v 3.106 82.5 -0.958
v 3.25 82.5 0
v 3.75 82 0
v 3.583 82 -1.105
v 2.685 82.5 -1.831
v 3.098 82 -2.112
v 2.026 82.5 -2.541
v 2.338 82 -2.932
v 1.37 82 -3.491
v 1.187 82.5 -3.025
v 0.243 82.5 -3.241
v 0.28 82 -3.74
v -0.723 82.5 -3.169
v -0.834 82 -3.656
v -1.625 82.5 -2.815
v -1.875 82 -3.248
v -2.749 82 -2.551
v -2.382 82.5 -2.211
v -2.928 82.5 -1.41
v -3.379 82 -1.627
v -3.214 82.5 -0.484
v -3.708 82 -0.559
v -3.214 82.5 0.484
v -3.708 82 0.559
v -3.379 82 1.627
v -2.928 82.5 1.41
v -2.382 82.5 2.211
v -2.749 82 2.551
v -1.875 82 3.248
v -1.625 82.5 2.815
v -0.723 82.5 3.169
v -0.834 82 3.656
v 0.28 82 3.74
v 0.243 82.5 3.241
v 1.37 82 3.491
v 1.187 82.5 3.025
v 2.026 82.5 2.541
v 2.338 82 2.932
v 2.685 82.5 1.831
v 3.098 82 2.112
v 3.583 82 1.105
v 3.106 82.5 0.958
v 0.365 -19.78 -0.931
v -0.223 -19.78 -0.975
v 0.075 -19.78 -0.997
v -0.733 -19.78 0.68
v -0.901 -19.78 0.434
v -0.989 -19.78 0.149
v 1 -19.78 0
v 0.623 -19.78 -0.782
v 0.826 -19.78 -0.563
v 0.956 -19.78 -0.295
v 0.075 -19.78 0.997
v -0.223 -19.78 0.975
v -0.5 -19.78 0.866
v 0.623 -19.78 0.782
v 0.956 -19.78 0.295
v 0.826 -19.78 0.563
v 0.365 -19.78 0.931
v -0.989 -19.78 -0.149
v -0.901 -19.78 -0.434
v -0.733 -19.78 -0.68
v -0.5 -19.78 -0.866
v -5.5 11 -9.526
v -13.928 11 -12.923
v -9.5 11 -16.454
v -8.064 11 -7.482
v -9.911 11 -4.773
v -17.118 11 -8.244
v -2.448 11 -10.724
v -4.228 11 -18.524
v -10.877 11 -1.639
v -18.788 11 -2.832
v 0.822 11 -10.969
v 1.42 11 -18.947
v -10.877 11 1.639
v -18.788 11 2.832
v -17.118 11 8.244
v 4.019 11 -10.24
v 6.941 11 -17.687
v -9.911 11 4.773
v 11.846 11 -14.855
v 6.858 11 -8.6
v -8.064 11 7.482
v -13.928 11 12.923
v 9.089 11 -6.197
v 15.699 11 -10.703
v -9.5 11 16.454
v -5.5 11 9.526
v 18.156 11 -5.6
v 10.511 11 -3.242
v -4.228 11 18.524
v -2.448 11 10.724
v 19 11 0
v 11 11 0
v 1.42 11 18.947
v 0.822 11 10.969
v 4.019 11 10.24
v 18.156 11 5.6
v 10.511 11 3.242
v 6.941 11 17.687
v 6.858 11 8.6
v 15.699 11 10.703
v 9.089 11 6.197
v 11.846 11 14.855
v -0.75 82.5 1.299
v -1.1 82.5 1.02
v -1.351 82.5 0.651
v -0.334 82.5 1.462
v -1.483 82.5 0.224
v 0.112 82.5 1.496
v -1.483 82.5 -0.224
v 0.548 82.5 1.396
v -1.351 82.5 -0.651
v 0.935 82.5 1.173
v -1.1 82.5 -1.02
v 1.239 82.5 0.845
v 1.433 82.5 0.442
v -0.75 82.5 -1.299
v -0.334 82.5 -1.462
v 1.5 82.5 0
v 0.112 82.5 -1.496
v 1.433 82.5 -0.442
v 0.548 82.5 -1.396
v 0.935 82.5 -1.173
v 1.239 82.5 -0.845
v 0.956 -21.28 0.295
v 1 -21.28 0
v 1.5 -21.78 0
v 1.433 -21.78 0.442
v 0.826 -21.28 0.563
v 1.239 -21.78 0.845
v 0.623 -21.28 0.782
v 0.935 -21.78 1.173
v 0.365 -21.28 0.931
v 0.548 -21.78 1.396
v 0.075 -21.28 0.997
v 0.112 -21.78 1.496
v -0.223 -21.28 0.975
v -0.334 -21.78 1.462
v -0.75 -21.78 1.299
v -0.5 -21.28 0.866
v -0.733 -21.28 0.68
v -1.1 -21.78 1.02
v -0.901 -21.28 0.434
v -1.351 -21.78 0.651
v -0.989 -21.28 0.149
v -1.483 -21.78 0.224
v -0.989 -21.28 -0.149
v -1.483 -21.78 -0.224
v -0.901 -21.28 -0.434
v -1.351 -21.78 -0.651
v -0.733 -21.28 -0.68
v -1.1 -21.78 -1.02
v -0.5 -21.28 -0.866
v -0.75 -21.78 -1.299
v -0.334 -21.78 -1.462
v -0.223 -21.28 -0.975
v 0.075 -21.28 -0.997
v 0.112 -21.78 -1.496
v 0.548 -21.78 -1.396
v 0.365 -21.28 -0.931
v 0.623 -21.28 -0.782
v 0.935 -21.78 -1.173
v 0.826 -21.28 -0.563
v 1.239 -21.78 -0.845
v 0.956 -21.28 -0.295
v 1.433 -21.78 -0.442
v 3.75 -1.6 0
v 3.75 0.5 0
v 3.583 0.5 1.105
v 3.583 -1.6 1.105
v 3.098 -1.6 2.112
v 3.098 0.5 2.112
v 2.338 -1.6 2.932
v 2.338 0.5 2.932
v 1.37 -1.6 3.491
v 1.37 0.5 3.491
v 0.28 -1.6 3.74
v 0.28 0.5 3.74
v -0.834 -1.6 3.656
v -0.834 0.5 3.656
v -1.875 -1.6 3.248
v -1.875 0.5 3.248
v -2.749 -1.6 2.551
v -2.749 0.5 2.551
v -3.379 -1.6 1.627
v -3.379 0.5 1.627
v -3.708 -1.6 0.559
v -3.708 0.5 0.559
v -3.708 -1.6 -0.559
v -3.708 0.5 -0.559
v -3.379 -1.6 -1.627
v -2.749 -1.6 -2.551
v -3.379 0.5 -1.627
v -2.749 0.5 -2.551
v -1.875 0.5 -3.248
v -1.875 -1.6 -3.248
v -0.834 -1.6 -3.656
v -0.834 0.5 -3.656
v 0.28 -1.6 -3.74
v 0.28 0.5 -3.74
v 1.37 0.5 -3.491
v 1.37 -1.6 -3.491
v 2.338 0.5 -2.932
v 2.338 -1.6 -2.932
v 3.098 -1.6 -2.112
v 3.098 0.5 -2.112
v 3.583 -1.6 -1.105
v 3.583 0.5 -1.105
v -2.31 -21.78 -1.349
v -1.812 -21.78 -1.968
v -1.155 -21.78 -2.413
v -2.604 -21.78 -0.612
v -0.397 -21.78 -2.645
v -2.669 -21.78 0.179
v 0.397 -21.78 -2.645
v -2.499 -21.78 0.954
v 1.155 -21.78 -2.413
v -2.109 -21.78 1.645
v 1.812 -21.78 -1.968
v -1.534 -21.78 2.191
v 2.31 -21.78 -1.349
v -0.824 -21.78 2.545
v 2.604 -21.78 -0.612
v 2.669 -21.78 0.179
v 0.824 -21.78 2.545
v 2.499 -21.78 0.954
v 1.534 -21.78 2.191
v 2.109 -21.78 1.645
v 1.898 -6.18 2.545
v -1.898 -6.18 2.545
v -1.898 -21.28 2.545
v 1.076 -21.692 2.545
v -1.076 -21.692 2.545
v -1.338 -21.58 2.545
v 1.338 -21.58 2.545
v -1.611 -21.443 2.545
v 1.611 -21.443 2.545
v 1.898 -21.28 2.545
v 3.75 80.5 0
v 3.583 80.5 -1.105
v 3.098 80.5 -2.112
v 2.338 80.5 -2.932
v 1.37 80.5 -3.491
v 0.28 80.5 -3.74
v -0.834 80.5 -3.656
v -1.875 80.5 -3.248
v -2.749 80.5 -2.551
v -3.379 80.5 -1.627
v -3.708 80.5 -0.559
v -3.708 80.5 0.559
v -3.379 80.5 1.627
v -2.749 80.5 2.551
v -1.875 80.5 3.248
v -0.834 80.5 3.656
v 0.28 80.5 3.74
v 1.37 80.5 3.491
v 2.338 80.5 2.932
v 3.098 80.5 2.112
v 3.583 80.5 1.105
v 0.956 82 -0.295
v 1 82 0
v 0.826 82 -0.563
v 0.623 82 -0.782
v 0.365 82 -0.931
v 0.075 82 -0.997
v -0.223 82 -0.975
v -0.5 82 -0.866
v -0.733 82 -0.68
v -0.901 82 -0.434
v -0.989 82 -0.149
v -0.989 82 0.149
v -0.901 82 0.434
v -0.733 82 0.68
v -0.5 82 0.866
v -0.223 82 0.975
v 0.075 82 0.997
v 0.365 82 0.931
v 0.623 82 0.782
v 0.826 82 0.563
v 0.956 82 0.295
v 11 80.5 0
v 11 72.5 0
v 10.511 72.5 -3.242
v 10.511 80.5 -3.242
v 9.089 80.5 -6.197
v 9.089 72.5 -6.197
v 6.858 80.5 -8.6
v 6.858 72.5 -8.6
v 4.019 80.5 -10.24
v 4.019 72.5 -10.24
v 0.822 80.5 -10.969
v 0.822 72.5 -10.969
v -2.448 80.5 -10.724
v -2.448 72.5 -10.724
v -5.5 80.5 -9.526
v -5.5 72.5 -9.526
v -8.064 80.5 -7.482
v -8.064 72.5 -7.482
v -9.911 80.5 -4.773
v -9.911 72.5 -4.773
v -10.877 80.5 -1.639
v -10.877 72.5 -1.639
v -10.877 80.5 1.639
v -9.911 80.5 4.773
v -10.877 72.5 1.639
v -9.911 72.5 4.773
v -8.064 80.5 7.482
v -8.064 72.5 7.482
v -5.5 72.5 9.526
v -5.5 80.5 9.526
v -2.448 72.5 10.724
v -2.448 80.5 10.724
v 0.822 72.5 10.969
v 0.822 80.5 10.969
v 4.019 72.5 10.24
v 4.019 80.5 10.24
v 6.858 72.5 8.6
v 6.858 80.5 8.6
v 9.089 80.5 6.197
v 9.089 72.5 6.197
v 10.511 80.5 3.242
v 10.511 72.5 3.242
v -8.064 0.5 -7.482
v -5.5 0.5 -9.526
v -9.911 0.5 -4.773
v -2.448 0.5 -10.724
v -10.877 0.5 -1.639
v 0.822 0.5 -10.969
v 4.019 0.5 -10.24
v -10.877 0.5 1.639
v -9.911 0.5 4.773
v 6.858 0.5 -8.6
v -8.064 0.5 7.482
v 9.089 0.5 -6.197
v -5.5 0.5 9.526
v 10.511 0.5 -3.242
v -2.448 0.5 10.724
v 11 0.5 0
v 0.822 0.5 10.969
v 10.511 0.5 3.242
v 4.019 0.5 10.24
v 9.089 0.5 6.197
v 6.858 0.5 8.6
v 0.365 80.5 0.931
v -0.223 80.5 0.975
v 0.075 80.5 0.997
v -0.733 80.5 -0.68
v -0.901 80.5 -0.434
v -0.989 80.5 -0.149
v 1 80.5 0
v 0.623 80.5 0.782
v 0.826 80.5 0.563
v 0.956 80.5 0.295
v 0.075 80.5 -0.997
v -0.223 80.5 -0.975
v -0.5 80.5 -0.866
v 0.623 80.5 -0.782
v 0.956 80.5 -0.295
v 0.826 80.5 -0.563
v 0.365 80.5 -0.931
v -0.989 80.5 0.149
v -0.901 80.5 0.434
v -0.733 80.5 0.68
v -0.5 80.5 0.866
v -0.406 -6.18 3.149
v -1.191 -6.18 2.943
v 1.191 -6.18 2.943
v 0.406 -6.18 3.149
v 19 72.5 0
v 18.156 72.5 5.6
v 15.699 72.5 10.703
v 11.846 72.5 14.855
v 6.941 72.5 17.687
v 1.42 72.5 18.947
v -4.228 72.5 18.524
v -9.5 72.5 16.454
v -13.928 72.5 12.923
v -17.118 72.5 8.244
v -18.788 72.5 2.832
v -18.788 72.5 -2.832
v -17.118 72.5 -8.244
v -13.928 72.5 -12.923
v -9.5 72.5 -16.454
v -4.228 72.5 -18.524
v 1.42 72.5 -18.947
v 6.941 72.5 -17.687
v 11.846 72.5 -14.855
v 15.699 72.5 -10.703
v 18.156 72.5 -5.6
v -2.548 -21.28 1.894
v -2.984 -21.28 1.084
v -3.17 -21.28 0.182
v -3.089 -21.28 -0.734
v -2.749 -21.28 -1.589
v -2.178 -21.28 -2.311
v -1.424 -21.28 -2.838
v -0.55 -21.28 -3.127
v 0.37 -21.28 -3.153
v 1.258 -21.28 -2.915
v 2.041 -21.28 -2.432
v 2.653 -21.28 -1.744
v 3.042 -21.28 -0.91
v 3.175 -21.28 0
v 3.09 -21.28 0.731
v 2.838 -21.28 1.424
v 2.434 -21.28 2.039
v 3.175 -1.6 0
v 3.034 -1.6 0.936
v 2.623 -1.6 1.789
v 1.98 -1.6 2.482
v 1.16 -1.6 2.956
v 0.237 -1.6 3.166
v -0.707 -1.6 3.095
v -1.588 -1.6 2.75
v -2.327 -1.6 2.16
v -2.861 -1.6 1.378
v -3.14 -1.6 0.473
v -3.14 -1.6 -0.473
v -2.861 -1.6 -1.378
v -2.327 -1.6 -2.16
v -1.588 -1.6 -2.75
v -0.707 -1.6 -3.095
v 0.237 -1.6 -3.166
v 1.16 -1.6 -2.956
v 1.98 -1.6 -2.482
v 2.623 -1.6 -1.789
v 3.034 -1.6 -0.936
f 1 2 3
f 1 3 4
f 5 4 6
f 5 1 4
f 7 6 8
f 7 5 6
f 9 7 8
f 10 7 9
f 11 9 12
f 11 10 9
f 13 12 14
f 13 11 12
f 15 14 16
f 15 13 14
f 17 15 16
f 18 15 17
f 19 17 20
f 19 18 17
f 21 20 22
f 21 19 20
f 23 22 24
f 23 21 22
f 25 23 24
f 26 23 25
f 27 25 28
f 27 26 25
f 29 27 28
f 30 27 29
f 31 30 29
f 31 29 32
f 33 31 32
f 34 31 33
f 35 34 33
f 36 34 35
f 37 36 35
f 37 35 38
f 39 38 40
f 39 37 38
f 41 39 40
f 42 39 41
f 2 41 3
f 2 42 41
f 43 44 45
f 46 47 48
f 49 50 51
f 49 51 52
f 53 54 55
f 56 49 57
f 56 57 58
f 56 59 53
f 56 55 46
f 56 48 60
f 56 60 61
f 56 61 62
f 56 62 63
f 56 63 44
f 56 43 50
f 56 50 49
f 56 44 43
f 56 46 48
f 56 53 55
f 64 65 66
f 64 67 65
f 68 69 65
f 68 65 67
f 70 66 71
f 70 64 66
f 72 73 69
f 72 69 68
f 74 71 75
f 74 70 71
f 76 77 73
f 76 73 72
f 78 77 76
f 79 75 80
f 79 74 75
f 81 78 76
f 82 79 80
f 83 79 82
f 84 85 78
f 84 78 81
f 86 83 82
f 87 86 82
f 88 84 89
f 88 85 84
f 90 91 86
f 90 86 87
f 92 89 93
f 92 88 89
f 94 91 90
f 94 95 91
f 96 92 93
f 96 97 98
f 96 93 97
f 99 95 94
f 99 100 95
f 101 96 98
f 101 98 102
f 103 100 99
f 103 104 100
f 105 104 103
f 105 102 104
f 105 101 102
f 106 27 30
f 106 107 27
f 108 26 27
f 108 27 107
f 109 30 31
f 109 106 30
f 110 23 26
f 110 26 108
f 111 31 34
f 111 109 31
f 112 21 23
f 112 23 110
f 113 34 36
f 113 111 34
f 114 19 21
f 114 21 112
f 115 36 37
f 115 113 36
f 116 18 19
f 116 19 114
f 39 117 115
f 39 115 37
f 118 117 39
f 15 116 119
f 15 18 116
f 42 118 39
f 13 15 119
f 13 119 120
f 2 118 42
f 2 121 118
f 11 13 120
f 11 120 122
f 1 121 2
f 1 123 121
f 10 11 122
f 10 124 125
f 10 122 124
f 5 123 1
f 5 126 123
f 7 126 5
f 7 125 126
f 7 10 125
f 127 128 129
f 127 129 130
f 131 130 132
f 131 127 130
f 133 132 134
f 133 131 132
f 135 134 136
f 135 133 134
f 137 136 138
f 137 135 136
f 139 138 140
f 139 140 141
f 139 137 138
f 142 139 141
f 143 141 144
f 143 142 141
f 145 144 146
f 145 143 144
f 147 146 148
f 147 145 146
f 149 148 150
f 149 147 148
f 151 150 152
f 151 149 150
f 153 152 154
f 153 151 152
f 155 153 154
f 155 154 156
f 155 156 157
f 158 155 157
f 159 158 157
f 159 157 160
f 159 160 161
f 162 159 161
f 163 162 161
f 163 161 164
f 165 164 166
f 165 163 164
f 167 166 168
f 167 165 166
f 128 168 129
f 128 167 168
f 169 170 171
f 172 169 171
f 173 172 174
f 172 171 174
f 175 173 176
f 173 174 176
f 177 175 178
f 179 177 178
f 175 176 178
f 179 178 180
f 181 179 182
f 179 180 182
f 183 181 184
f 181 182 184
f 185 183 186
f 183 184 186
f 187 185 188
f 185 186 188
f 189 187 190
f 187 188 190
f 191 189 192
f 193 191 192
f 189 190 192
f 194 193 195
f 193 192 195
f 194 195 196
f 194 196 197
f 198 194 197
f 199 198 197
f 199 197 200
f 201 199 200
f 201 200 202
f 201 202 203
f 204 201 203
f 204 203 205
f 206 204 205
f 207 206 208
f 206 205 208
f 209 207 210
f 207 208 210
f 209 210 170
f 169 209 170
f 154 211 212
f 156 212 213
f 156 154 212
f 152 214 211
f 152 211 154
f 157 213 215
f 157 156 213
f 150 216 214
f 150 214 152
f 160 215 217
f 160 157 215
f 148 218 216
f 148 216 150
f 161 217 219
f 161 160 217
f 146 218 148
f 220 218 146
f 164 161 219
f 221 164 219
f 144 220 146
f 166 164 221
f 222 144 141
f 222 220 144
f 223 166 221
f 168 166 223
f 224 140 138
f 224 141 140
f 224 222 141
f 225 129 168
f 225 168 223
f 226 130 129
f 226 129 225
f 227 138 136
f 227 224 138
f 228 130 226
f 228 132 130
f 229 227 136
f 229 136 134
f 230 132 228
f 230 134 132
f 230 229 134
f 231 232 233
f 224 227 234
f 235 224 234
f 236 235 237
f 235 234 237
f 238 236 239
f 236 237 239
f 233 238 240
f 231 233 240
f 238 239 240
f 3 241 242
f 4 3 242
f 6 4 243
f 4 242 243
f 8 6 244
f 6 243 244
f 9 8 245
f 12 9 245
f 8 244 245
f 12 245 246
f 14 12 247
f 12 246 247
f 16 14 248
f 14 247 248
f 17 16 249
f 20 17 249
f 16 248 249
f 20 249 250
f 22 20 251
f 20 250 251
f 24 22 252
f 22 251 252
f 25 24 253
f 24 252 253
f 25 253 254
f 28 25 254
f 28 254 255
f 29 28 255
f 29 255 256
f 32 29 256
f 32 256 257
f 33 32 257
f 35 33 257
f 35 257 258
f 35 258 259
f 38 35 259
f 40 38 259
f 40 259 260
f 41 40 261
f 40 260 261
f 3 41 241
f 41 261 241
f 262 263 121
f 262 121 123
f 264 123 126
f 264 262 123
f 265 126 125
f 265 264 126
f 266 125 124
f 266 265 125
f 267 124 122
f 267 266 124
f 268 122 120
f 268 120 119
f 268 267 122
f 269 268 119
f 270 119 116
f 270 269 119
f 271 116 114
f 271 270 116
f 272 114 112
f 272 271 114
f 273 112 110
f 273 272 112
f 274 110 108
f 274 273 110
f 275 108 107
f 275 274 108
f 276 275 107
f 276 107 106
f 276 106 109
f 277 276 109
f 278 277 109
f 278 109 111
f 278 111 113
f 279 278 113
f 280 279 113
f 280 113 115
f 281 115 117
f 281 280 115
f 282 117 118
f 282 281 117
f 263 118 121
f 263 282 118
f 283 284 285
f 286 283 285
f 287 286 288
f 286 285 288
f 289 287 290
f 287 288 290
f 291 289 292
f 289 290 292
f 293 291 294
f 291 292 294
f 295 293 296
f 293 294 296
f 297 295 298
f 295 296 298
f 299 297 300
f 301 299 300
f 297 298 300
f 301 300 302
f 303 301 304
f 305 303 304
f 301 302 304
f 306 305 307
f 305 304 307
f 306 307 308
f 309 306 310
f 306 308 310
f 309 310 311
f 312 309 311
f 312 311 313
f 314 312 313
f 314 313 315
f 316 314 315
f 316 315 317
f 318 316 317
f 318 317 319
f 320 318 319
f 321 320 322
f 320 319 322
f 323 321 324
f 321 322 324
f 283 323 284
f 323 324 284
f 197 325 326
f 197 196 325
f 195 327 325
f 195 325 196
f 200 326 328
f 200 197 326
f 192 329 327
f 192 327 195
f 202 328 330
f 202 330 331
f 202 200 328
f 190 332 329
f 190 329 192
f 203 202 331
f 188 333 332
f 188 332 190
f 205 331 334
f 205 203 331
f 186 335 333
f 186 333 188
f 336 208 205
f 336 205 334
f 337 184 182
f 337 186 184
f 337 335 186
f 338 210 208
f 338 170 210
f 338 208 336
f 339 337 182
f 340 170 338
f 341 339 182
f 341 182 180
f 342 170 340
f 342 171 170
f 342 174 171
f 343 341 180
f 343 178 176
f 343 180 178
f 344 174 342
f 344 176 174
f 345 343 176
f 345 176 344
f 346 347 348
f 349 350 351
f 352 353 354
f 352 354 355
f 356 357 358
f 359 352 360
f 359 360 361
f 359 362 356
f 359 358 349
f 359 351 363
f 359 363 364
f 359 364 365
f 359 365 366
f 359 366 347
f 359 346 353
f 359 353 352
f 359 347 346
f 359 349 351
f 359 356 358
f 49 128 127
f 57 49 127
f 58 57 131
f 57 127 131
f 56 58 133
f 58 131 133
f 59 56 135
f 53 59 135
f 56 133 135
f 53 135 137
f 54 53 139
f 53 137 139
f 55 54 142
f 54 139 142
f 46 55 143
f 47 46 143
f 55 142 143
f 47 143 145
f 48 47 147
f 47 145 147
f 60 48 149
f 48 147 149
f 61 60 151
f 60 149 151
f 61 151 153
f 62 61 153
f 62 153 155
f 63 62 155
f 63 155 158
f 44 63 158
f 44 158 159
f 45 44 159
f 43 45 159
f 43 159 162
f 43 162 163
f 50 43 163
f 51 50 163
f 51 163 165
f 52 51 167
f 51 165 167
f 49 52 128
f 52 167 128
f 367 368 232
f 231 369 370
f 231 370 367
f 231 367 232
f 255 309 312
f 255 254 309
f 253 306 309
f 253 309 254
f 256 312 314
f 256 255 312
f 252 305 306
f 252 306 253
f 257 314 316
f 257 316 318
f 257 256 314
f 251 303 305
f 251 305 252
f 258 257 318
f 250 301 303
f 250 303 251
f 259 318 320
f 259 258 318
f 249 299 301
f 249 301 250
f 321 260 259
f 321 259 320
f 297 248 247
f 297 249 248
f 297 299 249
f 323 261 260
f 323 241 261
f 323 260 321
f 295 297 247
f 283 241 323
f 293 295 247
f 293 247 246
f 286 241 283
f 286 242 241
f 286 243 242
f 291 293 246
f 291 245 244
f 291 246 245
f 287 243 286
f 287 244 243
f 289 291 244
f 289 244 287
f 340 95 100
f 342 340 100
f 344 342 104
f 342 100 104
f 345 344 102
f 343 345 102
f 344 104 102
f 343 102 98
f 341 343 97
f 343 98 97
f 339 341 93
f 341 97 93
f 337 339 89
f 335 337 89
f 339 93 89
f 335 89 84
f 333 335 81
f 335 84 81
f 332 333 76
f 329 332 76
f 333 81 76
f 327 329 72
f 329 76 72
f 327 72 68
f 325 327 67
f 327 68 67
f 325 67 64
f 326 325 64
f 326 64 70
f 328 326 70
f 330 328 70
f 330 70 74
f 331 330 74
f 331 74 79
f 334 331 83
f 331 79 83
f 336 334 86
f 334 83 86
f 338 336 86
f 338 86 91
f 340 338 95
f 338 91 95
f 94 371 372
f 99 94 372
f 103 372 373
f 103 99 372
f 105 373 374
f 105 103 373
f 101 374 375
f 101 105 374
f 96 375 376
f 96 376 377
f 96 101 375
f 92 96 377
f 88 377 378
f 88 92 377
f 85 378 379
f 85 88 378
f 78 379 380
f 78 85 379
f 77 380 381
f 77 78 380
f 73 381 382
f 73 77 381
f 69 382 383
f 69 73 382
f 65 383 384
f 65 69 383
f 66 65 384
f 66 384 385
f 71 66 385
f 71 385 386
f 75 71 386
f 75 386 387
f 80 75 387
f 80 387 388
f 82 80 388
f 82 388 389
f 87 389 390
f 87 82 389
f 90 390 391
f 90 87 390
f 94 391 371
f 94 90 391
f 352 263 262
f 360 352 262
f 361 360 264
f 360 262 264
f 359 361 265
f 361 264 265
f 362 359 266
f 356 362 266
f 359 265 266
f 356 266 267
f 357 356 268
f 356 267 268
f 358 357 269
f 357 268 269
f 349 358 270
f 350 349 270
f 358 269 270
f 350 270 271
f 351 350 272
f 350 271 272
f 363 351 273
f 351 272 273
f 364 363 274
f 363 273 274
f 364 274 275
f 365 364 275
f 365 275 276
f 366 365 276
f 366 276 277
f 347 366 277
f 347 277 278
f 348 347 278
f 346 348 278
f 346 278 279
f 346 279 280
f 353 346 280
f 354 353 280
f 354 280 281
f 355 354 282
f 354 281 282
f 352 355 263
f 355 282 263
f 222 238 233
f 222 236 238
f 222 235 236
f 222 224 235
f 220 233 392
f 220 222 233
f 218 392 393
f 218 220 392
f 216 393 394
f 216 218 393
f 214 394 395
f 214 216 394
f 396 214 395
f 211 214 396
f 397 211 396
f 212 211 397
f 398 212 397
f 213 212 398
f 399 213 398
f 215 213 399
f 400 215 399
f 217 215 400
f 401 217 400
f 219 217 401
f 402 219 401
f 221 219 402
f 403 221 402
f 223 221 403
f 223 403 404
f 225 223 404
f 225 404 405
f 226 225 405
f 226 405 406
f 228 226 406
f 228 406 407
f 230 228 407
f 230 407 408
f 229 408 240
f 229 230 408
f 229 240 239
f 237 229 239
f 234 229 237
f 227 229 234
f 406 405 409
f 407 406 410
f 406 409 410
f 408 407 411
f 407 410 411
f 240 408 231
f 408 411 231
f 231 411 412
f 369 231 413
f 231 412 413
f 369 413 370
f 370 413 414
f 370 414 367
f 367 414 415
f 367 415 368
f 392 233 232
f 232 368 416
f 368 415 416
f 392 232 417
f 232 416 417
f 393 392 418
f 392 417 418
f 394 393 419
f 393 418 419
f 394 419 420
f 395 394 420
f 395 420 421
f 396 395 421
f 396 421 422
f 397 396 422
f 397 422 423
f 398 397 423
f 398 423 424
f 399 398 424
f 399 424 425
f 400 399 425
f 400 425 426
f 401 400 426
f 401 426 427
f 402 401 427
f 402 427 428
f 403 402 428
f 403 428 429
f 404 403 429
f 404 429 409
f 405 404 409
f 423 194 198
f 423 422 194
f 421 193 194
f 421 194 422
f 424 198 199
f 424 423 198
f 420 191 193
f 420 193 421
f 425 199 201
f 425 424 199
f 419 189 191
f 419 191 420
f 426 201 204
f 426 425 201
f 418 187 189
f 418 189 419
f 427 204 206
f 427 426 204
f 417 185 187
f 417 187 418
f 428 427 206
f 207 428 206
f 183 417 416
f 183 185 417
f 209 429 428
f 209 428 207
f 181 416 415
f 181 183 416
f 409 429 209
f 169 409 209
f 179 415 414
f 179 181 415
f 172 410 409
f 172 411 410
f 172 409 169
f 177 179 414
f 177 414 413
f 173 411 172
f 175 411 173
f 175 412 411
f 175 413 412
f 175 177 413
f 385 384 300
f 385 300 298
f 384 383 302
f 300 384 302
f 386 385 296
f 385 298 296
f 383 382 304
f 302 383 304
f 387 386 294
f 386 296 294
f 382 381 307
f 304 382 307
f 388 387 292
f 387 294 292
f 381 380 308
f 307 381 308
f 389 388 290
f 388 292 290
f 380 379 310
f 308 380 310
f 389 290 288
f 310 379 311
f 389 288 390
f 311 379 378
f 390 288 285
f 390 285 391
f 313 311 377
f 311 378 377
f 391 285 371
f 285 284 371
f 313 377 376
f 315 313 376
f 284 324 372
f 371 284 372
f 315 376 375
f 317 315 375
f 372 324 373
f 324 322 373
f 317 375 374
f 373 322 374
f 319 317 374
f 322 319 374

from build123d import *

# Parameters (mm, degrees)
SKETCH025_R     = 19
PAD012_DEPTH    = 61.5
SKETCH026_R     = 11
PAD013_DEPTH    = 10.5
SKETCH027_R     = 11
PAD014_DEPTH    = 8
SKETCH028_R     = 3.75
PAD015_DEPTH    = 2
SKETCH029_R     = 1
POCKET011_DEPTH = 2
CHAMFER002_SIZE = 0.5
SKETCH030_R     = 3.75
PAD016_DEPTH    = 2.1
SKETCH031_R     = 3.175
PAD017_DEPTH    = 20.18
POCKET012_DEPTH = 15.6
SKETCH033_R     = 1
POCKET013_DEPTH = 2
CHAMFER003_SIZE = 0.5


with BuildPart() as part:
    # Sketch025 → Pad012 (new body)
    with BuildSketch(Plane.XZ):
        Circle(SKETCH025_R)
    extrude(amount=-PAD012_DEPTH)

    # Sketch026 (on Face2 of Pad012) → Pad013 (join)
    with BuildSketch(Plane.XZ):
        Circle(SKETCH026_R)
    extrude(amount=PAD013_DEPTH)

    # Sketch027 (on Face3 of Pad013) → Pad014 (join)
    with BuildSketch(Plane(origin=(0, 61.5, 0), x_dir=(1, 0, 0), z_dir=(0, 1, 0))):
        Circle(SKETCH027_R)
    extrude(amount=PAD014_DEPTH)

    # Sketch028 (on Face7 of Pad014) → Pad015 (join)
    with BuildSketch(Plane(origin=(0, 69.5, 0), x_dir=(1, 0, 0), z_dir=(0, 1, 0))):
        Circle(SKETCH028_R)
    extrude(amount=PAD015_DEPTH)

    # Sketch029 (on Face9 of Pad015) → Pocket011 (cut)
    with BuildSketch(Plane(origin=(0, 71.5, 0), x_dir=(1, 0, 0), z_dir=(0, 1, 0))):
        Circle(SKETCH029_R)
    extrude(amount=-POCKET011_DEPTH, mode=Mode.SUBTRACT)

    # Chamfer002
    chamfer002_edges = [part.edges().sort_by_distance(p)[0] for p in [
        (-3.75, 71.5, 0),
        (-1, 71.5, 0),
    ]]
    chamfer(chamfer002_edges, length=CHAMFER002_SIZE)

    # Sketch030 (on Face13 of Chamfer002) → Pad016 (join)
    with BuildSketch(Plane.XZ.offset(10.5)):
        Circle(SKETCH030_R)
    extrude(amount=PAD016_DEPTH)

    # Sketch031 (on Face15 of Pad016) → Pad017 (join)
    with BuildSketch(Plane.XZ.offset(12.6)):
        Circle(SKETCH031_R)
    extrude(amount=PAD017_DEPTH)

    # Sketch032 (on Face17 of Pad017) → Pocket012 (cut)
    with BuildSketch(Plane.XZ.offset(32.78)):
        with BuildLine():
            Line((-1.898315, 2.545), (1.898315, 2.545))
            ThreePointArc((1.898315, 2.545), (0, 3.175), (-1.898315, 2.545))
        make_face()
    extrude(amount=-POCKET012_DEPTH, mode=Mode.SUBTRACT)

    # Sketch033 (on Face17 of Pocket012) → Pocket013 (cut)
    with BuildSketch(Plane.XZ.offset(32.78)):
        Circle(SKETCH033_R)
    extrude(amount=-POCKET013_DEPTH, mode=Mode.SUBTRACT)

    # Chamfer003
    chamfer003_edges = [part.edges().sort_by_distance(p)[0] for p in [
        (-1, -32.78, 0),
        (-1.423635, -32.78, -2.837937),
        (2.837937, -32.78, 1.423635),
    ]]
    chamfer(chamfer003_edges, length=CHAMFER003_SIZE)


with BuildPart() as part_1:
    # Body010 placement: moved
    add(part.part.moved(Location((0, 11, 0))))


solid = part_1.part
